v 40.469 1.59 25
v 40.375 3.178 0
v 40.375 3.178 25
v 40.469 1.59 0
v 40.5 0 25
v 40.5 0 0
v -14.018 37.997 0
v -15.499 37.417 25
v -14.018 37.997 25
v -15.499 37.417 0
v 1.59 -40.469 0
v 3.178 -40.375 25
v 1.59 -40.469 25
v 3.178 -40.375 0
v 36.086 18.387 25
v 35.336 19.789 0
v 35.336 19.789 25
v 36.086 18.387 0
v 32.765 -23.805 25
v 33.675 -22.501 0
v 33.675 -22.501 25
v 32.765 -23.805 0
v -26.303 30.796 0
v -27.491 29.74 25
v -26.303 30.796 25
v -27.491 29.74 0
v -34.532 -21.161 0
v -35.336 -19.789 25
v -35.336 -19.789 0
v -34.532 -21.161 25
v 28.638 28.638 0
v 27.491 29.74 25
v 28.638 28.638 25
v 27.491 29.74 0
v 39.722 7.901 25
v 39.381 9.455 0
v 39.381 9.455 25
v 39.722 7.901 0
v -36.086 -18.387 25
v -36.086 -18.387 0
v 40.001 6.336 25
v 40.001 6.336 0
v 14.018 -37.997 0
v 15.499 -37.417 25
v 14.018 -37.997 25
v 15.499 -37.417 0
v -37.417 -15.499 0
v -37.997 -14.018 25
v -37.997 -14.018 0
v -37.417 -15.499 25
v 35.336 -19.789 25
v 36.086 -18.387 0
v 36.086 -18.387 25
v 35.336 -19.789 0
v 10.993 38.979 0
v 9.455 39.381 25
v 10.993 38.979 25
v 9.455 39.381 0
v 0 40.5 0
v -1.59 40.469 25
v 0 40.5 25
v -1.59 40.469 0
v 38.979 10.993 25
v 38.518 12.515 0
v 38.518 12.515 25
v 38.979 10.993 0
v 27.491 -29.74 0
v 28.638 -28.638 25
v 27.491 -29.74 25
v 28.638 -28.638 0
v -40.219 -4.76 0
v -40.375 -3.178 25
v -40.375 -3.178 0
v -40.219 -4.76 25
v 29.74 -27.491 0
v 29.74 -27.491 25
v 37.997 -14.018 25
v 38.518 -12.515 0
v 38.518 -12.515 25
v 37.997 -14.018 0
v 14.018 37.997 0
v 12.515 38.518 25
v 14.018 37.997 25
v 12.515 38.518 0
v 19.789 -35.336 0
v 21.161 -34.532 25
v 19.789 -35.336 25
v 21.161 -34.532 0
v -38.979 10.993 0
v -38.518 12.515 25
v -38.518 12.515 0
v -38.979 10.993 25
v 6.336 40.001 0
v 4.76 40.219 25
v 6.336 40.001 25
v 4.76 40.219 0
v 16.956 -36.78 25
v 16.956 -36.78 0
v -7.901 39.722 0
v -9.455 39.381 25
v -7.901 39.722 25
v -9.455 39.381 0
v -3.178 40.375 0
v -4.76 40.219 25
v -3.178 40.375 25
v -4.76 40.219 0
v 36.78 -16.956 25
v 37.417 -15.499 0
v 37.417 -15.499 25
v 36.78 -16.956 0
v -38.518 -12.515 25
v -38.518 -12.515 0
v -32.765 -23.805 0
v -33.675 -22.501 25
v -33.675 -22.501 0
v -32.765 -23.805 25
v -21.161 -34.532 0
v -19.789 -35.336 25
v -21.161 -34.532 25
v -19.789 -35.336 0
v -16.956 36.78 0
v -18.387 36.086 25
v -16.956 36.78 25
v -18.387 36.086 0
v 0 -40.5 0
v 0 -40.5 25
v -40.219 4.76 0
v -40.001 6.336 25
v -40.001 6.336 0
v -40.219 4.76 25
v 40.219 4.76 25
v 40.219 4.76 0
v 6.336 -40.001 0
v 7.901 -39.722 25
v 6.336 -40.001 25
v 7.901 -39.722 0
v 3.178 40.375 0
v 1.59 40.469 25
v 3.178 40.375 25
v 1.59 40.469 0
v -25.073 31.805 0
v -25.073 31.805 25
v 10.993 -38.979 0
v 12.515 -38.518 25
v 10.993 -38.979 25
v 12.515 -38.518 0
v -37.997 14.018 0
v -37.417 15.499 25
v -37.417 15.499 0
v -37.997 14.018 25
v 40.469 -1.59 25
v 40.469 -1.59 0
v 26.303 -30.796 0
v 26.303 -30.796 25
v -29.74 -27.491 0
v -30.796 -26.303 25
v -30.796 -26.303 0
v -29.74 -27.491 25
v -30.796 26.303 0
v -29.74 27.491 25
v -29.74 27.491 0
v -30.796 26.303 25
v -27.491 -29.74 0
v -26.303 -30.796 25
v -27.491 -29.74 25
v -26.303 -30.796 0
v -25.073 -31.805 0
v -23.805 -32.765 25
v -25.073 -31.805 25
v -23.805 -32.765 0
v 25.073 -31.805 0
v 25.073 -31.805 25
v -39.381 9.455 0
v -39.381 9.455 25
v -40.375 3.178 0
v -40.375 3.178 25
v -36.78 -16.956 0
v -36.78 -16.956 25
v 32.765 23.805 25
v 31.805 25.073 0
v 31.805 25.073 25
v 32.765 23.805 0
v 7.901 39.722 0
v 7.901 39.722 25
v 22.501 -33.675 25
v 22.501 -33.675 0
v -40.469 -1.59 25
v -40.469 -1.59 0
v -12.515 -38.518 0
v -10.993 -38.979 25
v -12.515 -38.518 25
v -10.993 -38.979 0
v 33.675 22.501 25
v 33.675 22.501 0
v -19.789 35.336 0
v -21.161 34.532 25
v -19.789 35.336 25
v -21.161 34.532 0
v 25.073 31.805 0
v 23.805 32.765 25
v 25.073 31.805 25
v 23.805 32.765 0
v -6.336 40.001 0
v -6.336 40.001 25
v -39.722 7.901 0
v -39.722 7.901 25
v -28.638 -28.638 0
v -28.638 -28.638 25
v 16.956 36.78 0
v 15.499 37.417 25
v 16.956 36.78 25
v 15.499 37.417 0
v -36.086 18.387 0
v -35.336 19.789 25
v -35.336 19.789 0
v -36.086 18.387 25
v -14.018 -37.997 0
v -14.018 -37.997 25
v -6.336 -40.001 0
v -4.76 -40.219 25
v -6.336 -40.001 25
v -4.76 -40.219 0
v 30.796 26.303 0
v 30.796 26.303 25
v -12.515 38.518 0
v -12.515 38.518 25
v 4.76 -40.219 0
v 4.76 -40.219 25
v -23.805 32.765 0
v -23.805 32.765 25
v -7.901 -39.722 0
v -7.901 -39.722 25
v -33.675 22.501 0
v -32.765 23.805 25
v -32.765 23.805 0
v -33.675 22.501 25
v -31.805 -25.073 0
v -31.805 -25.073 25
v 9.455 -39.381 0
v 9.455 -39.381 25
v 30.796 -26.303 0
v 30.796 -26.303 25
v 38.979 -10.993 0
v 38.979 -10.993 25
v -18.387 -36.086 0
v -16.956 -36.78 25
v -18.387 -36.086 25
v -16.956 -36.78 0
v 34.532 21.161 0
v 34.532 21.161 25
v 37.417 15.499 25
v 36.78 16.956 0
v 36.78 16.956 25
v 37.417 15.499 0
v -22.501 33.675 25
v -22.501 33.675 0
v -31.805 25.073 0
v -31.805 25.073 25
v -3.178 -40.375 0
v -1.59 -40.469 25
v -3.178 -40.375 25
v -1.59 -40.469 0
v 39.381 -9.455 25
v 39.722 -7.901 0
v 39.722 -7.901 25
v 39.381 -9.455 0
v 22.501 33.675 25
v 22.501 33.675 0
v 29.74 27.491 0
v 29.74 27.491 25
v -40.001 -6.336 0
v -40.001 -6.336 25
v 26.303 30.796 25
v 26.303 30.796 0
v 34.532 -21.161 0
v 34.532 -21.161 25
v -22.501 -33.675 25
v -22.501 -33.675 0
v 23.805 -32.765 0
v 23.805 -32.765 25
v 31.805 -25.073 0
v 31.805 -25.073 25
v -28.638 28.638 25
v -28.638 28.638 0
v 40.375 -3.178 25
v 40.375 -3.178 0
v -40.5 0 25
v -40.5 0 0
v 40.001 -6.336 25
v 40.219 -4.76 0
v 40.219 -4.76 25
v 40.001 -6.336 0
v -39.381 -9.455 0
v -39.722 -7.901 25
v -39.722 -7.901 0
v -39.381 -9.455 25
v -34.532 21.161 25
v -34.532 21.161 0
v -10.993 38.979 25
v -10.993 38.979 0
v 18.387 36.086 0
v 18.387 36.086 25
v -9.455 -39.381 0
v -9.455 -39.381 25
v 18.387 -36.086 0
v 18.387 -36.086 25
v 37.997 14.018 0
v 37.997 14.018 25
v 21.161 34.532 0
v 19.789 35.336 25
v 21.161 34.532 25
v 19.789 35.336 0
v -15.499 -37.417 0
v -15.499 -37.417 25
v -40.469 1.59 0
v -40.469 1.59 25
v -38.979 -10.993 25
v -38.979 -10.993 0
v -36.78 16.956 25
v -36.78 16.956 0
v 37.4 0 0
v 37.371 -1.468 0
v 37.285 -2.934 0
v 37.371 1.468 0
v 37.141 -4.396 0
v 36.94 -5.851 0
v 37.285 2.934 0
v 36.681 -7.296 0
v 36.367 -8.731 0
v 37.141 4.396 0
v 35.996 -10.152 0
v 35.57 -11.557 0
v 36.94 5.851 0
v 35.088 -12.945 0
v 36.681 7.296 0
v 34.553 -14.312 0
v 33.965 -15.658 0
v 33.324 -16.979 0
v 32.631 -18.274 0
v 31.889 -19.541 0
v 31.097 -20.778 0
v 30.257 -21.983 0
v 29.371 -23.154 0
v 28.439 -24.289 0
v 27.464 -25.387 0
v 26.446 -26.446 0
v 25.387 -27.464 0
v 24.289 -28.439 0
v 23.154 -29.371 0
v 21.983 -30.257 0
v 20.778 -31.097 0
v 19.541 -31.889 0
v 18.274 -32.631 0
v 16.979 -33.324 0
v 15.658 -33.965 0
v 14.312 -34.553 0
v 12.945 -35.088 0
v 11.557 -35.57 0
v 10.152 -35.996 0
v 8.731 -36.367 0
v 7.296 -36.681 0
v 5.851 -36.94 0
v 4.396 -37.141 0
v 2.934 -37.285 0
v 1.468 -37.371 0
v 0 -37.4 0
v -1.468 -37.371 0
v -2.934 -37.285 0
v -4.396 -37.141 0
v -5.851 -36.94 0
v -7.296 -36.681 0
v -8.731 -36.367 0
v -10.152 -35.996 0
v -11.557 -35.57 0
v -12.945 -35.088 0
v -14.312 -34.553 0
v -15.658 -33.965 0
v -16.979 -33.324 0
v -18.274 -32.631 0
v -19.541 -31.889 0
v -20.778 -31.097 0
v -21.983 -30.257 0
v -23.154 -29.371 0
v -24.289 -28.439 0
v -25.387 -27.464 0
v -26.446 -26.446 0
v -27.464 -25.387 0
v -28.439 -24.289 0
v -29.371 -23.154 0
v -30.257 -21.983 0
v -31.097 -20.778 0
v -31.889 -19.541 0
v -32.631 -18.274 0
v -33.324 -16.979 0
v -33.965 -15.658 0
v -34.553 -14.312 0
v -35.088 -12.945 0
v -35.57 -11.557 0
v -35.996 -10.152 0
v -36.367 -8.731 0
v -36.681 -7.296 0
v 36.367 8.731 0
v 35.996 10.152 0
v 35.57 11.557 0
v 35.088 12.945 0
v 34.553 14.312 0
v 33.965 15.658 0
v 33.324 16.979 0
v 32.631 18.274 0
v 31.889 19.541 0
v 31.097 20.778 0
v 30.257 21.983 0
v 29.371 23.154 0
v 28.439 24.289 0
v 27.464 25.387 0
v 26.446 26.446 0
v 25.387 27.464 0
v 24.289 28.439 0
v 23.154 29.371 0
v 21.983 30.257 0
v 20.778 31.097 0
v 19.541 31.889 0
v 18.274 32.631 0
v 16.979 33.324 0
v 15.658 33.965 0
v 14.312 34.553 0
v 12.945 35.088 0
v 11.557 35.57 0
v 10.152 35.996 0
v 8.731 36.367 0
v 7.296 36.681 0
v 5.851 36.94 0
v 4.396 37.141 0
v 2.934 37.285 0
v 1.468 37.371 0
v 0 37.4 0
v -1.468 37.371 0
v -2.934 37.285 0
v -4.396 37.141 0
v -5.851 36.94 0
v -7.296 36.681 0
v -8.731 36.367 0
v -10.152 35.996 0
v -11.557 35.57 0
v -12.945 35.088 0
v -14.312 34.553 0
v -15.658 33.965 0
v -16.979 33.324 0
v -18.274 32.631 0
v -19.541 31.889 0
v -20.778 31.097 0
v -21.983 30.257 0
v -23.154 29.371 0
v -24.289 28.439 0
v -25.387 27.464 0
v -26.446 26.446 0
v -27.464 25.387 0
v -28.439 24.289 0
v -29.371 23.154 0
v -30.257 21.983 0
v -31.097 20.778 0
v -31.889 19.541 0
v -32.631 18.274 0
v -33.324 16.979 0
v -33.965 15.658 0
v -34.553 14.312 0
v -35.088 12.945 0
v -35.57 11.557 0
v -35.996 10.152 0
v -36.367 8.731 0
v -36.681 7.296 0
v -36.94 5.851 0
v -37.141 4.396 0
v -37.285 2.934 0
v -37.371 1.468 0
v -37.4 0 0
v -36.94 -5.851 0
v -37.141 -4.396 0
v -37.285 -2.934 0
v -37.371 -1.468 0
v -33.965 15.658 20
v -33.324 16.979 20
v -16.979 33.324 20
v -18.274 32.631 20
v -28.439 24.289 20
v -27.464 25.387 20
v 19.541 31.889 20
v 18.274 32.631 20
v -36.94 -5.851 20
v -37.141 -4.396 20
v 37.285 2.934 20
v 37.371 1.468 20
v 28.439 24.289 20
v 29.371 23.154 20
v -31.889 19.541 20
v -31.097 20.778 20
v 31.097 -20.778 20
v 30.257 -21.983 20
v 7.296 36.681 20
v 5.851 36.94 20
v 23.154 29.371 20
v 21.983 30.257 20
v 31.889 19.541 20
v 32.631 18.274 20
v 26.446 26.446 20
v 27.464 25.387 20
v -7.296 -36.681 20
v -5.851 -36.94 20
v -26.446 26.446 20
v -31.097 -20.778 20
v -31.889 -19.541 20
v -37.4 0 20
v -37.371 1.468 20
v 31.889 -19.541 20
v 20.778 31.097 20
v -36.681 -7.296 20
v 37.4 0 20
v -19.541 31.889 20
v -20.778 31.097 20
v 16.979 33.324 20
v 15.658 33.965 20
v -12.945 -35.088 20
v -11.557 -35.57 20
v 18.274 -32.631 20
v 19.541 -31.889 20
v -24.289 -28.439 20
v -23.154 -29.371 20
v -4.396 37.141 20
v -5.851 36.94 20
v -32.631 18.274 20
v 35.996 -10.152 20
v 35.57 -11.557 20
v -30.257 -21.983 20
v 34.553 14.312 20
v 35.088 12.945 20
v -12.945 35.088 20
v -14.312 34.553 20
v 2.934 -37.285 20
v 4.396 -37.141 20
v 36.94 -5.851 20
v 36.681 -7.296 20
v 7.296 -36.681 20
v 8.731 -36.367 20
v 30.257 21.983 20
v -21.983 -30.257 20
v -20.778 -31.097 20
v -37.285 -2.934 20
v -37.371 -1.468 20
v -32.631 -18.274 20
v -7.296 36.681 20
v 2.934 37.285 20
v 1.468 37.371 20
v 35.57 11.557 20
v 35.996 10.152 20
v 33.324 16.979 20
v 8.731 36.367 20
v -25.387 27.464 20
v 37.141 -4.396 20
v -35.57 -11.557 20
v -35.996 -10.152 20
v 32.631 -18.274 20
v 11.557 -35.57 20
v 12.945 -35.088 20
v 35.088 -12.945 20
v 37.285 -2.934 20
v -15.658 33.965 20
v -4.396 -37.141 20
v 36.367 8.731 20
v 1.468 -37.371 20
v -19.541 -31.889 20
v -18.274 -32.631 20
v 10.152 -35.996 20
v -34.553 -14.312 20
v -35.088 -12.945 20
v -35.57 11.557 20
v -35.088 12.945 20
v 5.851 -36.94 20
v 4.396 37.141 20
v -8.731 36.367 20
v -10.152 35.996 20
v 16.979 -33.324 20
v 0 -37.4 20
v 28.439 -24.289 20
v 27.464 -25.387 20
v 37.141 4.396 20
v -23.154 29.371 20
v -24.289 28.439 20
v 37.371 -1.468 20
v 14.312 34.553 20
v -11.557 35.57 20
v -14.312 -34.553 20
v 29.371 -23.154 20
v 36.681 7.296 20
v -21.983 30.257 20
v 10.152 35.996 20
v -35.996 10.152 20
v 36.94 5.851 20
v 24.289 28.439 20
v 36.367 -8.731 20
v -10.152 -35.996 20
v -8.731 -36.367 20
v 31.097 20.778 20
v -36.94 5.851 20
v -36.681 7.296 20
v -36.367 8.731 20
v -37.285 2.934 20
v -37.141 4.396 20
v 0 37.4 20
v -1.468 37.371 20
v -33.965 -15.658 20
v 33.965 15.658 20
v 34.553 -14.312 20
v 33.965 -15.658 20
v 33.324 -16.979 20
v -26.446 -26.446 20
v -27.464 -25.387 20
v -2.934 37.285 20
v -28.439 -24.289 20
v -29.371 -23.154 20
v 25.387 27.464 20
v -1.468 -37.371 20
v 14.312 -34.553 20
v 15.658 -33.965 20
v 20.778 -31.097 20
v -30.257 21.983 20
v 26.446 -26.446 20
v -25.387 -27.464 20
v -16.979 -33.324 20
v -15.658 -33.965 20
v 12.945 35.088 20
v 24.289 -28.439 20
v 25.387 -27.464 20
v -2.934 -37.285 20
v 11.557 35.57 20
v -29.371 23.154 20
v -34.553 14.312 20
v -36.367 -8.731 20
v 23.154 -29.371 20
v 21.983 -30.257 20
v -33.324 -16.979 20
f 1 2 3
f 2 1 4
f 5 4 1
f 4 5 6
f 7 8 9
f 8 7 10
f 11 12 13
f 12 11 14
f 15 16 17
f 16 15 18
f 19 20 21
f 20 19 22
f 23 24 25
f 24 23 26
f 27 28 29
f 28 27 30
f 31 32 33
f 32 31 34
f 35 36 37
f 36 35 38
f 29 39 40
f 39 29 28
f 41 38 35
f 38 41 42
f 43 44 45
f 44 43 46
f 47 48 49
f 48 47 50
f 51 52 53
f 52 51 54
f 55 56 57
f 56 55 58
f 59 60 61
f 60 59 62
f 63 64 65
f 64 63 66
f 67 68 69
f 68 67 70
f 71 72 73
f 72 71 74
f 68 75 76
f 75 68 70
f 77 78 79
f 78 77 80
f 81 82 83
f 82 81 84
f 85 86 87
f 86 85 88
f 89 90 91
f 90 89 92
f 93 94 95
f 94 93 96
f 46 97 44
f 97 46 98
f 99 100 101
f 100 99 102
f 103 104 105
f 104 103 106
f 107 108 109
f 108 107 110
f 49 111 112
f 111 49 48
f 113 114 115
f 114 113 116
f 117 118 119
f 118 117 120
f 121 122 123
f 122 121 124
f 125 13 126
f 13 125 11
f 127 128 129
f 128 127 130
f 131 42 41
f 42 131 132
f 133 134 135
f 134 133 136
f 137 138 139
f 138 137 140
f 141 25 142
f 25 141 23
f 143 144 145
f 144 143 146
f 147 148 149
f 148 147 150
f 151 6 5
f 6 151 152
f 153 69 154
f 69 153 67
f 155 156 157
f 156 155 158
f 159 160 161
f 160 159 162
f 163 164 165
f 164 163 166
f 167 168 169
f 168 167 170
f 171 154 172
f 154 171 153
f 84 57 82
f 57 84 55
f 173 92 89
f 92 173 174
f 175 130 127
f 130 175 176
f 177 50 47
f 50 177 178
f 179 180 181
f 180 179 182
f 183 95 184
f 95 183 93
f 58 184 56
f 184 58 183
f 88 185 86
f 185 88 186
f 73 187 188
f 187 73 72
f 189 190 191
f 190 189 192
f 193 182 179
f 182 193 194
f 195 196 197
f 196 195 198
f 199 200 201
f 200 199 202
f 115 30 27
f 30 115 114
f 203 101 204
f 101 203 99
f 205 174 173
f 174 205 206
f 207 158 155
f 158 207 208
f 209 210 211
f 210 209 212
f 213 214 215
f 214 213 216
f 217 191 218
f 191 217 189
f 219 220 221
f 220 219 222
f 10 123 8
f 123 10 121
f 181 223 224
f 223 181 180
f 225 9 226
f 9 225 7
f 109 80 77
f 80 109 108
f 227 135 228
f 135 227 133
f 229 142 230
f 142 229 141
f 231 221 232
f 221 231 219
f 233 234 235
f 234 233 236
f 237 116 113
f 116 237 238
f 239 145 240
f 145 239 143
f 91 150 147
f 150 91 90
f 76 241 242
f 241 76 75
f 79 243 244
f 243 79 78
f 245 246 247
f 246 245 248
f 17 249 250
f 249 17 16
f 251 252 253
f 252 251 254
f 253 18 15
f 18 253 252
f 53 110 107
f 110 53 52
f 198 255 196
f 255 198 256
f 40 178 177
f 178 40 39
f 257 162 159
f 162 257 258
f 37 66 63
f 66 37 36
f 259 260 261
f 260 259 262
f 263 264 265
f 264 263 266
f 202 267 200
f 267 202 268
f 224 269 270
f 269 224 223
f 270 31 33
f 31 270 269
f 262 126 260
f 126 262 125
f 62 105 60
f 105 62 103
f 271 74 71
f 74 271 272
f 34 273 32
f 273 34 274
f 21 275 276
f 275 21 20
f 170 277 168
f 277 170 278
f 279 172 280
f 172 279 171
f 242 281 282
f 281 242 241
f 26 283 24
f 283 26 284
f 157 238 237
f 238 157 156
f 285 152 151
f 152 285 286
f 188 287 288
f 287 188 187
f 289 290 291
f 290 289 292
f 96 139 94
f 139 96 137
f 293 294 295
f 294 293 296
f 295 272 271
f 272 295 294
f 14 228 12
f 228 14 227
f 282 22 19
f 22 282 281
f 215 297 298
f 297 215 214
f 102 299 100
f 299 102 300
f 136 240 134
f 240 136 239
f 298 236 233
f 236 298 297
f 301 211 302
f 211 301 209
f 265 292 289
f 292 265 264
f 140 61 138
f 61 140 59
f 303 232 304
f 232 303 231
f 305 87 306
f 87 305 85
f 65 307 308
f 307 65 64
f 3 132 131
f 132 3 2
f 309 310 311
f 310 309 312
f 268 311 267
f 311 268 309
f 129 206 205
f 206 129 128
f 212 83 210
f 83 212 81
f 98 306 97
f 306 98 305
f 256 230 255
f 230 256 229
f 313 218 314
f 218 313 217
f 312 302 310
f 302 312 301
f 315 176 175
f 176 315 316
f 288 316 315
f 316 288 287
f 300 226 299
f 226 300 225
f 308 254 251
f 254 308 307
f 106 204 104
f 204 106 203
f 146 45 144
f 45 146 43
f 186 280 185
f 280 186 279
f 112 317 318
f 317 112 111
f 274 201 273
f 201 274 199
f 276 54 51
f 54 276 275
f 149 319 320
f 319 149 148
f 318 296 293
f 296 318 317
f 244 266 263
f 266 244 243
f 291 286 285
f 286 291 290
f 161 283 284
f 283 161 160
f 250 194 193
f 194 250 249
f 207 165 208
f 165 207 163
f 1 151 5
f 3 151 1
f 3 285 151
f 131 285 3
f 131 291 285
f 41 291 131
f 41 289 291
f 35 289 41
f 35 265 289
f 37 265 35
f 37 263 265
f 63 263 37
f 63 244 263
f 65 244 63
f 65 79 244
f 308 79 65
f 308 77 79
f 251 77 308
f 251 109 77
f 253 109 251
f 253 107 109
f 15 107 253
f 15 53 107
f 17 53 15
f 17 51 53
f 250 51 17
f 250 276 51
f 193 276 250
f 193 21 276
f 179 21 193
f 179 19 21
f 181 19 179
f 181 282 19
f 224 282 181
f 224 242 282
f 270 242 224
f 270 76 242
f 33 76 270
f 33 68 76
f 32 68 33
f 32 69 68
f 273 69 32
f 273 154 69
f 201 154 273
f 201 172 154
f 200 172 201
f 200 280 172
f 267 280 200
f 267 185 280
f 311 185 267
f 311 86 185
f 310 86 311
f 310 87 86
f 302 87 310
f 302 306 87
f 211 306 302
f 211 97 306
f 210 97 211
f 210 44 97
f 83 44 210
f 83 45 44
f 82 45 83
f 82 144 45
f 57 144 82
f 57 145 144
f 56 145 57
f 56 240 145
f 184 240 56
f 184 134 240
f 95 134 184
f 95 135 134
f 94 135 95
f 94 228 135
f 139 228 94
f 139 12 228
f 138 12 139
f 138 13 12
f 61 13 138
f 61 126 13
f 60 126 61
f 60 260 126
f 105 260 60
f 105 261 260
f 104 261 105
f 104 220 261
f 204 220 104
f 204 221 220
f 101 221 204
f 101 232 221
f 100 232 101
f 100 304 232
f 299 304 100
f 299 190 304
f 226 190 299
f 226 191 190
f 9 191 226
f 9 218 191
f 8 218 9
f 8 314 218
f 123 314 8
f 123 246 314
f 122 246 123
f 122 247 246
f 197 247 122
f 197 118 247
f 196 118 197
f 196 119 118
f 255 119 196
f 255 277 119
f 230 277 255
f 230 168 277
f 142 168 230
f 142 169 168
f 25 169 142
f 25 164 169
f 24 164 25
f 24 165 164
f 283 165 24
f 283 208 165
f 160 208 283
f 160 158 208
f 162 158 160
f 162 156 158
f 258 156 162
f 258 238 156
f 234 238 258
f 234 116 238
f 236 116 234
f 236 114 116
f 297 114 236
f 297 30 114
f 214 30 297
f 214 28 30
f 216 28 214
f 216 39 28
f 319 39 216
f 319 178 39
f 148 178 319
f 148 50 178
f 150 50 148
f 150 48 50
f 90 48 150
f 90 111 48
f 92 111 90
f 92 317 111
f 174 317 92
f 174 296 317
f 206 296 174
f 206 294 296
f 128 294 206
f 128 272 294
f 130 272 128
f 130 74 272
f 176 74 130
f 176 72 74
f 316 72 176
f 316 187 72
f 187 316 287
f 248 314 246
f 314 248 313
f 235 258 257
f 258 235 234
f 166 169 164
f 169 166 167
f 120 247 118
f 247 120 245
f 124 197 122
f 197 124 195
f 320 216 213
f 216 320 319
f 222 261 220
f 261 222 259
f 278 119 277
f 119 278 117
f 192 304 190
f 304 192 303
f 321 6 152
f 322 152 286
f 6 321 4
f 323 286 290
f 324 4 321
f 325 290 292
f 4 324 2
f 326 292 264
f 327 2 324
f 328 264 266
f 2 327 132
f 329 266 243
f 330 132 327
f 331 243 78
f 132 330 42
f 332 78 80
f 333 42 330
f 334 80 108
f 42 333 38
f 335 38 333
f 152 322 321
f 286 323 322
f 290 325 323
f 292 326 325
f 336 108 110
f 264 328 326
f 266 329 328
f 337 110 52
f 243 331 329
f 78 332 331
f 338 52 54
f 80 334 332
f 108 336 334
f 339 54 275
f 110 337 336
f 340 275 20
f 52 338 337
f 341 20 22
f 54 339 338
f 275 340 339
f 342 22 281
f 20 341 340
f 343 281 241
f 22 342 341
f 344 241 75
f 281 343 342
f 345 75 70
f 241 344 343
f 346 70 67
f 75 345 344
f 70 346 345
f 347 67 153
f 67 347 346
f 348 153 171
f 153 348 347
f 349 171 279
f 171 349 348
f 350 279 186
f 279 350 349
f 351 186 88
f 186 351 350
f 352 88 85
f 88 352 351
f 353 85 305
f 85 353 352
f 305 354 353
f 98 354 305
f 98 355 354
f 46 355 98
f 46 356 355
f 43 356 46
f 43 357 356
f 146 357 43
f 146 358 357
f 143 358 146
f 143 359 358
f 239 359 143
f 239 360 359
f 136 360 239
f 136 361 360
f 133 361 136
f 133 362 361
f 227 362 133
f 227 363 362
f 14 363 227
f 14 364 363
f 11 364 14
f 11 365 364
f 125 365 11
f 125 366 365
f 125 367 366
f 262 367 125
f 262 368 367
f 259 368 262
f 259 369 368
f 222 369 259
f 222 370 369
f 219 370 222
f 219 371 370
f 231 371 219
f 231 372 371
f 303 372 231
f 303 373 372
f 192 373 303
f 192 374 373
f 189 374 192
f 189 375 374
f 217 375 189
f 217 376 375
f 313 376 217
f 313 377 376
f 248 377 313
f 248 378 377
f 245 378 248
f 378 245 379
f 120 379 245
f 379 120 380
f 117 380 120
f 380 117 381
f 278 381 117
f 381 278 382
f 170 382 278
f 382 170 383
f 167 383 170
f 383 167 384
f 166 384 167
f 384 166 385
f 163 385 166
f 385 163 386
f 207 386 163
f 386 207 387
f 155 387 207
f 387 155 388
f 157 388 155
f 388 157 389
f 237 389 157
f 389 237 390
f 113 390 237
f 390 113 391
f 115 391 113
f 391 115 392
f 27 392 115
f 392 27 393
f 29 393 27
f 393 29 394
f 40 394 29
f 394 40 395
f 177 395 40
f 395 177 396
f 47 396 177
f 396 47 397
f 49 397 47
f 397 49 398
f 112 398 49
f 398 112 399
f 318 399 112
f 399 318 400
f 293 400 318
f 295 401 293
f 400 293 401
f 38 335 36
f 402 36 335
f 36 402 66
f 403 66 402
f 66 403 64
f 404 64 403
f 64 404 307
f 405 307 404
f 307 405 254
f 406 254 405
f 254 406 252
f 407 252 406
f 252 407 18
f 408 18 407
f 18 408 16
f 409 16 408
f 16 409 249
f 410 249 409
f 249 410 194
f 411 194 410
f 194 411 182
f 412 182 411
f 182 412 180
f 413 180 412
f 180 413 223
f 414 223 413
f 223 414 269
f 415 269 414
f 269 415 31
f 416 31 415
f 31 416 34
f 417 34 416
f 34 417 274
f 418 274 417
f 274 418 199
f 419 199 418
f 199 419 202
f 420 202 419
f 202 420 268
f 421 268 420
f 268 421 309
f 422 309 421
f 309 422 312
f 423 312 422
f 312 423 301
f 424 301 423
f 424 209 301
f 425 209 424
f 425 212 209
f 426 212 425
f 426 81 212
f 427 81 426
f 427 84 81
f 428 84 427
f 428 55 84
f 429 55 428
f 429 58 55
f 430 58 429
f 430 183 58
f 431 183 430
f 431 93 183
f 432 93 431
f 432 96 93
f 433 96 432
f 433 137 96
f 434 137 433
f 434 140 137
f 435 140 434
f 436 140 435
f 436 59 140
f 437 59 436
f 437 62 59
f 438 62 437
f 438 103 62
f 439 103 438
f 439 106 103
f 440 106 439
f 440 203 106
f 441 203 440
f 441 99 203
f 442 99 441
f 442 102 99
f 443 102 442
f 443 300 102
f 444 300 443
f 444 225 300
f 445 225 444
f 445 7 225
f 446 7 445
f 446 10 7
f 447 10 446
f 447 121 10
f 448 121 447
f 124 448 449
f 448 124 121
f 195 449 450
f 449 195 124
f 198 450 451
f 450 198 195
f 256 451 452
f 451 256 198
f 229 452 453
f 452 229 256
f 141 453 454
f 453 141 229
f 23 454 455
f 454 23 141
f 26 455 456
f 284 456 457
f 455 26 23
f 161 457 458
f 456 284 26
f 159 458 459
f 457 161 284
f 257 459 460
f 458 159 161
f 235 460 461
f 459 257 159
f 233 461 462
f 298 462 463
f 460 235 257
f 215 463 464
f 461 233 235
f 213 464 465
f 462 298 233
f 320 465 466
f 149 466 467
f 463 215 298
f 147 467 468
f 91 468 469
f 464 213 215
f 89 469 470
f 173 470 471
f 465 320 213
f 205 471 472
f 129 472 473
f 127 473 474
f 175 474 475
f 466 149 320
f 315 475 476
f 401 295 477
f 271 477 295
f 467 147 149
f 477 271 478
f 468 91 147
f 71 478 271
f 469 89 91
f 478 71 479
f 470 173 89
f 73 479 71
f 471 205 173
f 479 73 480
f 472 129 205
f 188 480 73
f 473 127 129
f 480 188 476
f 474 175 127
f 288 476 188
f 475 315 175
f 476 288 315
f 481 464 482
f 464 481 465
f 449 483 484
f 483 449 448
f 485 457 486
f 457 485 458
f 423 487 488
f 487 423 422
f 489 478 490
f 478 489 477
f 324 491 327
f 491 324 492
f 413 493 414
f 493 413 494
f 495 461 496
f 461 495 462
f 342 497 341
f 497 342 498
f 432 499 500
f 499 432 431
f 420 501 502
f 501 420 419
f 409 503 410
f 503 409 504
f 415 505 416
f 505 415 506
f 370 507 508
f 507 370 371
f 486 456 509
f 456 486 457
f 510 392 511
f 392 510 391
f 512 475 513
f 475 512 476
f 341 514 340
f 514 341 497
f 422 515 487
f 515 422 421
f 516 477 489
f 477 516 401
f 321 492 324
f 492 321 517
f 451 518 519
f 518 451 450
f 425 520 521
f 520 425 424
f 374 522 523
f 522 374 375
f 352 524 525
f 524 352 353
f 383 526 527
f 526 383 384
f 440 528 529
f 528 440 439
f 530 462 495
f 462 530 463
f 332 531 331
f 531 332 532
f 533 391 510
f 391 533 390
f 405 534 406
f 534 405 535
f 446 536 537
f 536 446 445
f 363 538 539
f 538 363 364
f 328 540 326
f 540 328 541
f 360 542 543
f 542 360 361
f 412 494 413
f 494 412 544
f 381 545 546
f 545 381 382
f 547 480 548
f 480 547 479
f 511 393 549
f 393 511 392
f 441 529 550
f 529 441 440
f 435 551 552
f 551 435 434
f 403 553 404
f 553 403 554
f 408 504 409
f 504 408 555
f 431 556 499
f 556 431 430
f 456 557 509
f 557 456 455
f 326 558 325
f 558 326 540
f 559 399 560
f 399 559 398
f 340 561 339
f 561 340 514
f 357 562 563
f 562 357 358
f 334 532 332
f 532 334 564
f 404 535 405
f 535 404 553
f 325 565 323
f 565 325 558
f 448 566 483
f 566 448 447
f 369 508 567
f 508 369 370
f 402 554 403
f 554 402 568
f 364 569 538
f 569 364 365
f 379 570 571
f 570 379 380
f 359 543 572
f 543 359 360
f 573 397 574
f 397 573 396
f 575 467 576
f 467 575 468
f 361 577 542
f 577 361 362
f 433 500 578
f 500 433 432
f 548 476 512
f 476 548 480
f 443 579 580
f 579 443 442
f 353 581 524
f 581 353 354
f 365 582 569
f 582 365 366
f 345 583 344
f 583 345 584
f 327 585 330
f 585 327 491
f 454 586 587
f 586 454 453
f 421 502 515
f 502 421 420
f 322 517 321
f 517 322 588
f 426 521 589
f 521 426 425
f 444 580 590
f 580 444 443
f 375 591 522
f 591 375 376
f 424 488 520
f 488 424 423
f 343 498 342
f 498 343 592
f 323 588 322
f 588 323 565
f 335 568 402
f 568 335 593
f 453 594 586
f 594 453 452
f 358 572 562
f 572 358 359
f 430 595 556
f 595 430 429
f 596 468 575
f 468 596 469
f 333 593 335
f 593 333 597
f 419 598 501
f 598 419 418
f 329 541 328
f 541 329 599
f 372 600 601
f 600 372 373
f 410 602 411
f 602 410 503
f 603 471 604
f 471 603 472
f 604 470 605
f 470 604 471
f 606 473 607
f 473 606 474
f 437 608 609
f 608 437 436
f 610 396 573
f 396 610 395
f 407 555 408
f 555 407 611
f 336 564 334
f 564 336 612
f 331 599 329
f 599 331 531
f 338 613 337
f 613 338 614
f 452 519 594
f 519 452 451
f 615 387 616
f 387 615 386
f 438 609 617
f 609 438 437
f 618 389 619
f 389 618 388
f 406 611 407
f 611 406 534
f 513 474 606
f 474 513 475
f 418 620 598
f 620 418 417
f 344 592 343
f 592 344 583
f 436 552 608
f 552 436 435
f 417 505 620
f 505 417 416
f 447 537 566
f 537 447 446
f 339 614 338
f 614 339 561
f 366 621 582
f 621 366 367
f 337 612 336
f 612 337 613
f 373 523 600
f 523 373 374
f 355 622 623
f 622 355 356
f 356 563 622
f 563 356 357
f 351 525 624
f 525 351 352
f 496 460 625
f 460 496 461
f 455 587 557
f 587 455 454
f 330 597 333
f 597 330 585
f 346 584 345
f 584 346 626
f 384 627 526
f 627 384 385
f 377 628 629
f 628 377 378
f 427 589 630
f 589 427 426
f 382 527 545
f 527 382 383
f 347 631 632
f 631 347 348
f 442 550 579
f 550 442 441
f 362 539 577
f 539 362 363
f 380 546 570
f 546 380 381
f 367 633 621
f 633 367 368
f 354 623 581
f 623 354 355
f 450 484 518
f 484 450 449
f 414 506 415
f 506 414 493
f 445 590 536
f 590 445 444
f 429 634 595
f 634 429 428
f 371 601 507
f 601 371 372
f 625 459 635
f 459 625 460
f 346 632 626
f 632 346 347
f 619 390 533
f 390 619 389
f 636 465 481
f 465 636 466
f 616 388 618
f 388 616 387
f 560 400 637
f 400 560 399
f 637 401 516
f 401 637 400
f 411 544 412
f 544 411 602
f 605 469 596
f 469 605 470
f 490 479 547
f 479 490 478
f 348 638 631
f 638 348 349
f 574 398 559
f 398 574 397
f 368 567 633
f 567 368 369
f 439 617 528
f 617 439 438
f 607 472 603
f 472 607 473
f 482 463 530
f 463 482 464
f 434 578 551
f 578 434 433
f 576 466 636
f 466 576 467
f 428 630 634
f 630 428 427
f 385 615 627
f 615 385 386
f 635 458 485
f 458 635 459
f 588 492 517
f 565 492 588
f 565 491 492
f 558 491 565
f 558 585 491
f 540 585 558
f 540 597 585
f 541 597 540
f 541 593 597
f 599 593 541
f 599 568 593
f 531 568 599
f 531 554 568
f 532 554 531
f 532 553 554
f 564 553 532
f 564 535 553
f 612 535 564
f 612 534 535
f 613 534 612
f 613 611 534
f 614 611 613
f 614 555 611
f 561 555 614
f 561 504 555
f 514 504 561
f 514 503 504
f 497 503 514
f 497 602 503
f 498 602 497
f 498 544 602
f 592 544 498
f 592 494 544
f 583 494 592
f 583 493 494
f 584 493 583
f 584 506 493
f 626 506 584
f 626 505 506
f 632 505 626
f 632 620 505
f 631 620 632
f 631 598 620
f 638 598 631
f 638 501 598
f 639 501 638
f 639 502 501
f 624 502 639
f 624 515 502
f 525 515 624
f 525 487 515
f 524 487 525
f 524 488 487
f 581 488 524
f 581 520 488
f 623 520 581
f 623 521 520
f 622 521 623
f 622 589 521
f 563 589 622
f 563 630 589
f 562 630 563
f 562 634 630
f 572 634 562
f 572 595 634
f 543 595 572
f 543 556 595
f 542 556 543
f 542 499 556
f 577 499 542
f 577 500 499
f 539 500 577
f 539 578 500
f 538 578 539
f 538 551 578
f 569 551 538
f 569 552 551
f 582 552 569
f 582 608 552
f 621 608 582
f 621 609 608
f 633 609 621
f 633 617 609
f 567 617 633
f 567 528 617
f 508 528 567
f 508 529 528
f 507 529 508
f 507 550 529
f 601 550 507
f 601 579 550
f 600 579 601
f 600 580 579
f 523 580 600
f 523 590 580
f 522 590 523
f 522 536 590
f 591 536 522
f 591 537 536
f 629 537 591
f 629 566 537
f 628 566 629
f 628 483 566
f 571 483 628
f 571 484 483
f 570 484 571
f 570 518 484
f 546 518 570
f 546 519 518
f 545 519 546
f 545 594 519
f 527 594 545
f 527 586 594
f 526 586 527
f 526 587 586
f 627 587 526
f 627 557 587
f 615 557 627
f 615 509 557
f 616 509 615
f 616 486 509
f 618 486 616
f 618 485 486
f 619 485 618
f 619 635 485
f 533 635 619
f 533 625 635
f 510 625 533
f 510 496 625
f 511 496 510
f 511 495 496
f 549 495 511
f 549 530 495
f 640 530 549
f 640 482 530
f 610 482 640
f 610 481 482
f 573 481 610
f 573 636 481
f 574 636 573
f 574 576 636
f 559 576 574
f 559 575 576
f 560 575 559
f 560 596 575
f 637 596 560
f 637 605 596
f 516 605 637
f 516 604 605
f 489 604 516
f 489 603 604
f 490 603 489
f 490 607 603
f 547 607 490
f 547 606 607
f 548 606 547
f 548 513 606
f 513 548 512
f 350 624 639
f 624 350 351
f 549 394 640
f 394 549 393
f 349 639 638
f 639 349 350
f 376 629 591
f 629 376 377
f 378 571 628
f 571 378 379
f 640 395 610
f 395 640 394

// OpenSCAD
// HT 75 cap (end cap) - single connected solid

$fn = 160;

// Parameters (mm)
ht_pipe_outer_diameter = 75;   // OD of pipe that fits into cap
wall_thickness         = 3;    // radial wall thickness of cap
insertion_depth        = 20;   // socket depth
cap_end_thickness      = 5;    // closed end thickness

// Robustness for boolean ops
eps = 0.2;

// Derived
cap_outer_diameter = ht_pipe_outer_diameter + 2 * wall_thickness;
cap_total_height   = insertion_depth + cap_end_thickness;

module ht_75_cap() {
    difference() {
        // Outer body
        cylinder(h = cap_total_height, d = cap_outer_diameter, center = false);

        // Inner void (socket): starts at open end (z=0) and stops before closed end
        // Use a slightly smaller diameter to avoid coincident faces that can render "blank"
        translate([0, 0, -eps])
            cylinder(h = insertion_depth + eps, d = ht_pipe_outer_diameter - eps, center = false);
    }
}

ht_75_cap();
